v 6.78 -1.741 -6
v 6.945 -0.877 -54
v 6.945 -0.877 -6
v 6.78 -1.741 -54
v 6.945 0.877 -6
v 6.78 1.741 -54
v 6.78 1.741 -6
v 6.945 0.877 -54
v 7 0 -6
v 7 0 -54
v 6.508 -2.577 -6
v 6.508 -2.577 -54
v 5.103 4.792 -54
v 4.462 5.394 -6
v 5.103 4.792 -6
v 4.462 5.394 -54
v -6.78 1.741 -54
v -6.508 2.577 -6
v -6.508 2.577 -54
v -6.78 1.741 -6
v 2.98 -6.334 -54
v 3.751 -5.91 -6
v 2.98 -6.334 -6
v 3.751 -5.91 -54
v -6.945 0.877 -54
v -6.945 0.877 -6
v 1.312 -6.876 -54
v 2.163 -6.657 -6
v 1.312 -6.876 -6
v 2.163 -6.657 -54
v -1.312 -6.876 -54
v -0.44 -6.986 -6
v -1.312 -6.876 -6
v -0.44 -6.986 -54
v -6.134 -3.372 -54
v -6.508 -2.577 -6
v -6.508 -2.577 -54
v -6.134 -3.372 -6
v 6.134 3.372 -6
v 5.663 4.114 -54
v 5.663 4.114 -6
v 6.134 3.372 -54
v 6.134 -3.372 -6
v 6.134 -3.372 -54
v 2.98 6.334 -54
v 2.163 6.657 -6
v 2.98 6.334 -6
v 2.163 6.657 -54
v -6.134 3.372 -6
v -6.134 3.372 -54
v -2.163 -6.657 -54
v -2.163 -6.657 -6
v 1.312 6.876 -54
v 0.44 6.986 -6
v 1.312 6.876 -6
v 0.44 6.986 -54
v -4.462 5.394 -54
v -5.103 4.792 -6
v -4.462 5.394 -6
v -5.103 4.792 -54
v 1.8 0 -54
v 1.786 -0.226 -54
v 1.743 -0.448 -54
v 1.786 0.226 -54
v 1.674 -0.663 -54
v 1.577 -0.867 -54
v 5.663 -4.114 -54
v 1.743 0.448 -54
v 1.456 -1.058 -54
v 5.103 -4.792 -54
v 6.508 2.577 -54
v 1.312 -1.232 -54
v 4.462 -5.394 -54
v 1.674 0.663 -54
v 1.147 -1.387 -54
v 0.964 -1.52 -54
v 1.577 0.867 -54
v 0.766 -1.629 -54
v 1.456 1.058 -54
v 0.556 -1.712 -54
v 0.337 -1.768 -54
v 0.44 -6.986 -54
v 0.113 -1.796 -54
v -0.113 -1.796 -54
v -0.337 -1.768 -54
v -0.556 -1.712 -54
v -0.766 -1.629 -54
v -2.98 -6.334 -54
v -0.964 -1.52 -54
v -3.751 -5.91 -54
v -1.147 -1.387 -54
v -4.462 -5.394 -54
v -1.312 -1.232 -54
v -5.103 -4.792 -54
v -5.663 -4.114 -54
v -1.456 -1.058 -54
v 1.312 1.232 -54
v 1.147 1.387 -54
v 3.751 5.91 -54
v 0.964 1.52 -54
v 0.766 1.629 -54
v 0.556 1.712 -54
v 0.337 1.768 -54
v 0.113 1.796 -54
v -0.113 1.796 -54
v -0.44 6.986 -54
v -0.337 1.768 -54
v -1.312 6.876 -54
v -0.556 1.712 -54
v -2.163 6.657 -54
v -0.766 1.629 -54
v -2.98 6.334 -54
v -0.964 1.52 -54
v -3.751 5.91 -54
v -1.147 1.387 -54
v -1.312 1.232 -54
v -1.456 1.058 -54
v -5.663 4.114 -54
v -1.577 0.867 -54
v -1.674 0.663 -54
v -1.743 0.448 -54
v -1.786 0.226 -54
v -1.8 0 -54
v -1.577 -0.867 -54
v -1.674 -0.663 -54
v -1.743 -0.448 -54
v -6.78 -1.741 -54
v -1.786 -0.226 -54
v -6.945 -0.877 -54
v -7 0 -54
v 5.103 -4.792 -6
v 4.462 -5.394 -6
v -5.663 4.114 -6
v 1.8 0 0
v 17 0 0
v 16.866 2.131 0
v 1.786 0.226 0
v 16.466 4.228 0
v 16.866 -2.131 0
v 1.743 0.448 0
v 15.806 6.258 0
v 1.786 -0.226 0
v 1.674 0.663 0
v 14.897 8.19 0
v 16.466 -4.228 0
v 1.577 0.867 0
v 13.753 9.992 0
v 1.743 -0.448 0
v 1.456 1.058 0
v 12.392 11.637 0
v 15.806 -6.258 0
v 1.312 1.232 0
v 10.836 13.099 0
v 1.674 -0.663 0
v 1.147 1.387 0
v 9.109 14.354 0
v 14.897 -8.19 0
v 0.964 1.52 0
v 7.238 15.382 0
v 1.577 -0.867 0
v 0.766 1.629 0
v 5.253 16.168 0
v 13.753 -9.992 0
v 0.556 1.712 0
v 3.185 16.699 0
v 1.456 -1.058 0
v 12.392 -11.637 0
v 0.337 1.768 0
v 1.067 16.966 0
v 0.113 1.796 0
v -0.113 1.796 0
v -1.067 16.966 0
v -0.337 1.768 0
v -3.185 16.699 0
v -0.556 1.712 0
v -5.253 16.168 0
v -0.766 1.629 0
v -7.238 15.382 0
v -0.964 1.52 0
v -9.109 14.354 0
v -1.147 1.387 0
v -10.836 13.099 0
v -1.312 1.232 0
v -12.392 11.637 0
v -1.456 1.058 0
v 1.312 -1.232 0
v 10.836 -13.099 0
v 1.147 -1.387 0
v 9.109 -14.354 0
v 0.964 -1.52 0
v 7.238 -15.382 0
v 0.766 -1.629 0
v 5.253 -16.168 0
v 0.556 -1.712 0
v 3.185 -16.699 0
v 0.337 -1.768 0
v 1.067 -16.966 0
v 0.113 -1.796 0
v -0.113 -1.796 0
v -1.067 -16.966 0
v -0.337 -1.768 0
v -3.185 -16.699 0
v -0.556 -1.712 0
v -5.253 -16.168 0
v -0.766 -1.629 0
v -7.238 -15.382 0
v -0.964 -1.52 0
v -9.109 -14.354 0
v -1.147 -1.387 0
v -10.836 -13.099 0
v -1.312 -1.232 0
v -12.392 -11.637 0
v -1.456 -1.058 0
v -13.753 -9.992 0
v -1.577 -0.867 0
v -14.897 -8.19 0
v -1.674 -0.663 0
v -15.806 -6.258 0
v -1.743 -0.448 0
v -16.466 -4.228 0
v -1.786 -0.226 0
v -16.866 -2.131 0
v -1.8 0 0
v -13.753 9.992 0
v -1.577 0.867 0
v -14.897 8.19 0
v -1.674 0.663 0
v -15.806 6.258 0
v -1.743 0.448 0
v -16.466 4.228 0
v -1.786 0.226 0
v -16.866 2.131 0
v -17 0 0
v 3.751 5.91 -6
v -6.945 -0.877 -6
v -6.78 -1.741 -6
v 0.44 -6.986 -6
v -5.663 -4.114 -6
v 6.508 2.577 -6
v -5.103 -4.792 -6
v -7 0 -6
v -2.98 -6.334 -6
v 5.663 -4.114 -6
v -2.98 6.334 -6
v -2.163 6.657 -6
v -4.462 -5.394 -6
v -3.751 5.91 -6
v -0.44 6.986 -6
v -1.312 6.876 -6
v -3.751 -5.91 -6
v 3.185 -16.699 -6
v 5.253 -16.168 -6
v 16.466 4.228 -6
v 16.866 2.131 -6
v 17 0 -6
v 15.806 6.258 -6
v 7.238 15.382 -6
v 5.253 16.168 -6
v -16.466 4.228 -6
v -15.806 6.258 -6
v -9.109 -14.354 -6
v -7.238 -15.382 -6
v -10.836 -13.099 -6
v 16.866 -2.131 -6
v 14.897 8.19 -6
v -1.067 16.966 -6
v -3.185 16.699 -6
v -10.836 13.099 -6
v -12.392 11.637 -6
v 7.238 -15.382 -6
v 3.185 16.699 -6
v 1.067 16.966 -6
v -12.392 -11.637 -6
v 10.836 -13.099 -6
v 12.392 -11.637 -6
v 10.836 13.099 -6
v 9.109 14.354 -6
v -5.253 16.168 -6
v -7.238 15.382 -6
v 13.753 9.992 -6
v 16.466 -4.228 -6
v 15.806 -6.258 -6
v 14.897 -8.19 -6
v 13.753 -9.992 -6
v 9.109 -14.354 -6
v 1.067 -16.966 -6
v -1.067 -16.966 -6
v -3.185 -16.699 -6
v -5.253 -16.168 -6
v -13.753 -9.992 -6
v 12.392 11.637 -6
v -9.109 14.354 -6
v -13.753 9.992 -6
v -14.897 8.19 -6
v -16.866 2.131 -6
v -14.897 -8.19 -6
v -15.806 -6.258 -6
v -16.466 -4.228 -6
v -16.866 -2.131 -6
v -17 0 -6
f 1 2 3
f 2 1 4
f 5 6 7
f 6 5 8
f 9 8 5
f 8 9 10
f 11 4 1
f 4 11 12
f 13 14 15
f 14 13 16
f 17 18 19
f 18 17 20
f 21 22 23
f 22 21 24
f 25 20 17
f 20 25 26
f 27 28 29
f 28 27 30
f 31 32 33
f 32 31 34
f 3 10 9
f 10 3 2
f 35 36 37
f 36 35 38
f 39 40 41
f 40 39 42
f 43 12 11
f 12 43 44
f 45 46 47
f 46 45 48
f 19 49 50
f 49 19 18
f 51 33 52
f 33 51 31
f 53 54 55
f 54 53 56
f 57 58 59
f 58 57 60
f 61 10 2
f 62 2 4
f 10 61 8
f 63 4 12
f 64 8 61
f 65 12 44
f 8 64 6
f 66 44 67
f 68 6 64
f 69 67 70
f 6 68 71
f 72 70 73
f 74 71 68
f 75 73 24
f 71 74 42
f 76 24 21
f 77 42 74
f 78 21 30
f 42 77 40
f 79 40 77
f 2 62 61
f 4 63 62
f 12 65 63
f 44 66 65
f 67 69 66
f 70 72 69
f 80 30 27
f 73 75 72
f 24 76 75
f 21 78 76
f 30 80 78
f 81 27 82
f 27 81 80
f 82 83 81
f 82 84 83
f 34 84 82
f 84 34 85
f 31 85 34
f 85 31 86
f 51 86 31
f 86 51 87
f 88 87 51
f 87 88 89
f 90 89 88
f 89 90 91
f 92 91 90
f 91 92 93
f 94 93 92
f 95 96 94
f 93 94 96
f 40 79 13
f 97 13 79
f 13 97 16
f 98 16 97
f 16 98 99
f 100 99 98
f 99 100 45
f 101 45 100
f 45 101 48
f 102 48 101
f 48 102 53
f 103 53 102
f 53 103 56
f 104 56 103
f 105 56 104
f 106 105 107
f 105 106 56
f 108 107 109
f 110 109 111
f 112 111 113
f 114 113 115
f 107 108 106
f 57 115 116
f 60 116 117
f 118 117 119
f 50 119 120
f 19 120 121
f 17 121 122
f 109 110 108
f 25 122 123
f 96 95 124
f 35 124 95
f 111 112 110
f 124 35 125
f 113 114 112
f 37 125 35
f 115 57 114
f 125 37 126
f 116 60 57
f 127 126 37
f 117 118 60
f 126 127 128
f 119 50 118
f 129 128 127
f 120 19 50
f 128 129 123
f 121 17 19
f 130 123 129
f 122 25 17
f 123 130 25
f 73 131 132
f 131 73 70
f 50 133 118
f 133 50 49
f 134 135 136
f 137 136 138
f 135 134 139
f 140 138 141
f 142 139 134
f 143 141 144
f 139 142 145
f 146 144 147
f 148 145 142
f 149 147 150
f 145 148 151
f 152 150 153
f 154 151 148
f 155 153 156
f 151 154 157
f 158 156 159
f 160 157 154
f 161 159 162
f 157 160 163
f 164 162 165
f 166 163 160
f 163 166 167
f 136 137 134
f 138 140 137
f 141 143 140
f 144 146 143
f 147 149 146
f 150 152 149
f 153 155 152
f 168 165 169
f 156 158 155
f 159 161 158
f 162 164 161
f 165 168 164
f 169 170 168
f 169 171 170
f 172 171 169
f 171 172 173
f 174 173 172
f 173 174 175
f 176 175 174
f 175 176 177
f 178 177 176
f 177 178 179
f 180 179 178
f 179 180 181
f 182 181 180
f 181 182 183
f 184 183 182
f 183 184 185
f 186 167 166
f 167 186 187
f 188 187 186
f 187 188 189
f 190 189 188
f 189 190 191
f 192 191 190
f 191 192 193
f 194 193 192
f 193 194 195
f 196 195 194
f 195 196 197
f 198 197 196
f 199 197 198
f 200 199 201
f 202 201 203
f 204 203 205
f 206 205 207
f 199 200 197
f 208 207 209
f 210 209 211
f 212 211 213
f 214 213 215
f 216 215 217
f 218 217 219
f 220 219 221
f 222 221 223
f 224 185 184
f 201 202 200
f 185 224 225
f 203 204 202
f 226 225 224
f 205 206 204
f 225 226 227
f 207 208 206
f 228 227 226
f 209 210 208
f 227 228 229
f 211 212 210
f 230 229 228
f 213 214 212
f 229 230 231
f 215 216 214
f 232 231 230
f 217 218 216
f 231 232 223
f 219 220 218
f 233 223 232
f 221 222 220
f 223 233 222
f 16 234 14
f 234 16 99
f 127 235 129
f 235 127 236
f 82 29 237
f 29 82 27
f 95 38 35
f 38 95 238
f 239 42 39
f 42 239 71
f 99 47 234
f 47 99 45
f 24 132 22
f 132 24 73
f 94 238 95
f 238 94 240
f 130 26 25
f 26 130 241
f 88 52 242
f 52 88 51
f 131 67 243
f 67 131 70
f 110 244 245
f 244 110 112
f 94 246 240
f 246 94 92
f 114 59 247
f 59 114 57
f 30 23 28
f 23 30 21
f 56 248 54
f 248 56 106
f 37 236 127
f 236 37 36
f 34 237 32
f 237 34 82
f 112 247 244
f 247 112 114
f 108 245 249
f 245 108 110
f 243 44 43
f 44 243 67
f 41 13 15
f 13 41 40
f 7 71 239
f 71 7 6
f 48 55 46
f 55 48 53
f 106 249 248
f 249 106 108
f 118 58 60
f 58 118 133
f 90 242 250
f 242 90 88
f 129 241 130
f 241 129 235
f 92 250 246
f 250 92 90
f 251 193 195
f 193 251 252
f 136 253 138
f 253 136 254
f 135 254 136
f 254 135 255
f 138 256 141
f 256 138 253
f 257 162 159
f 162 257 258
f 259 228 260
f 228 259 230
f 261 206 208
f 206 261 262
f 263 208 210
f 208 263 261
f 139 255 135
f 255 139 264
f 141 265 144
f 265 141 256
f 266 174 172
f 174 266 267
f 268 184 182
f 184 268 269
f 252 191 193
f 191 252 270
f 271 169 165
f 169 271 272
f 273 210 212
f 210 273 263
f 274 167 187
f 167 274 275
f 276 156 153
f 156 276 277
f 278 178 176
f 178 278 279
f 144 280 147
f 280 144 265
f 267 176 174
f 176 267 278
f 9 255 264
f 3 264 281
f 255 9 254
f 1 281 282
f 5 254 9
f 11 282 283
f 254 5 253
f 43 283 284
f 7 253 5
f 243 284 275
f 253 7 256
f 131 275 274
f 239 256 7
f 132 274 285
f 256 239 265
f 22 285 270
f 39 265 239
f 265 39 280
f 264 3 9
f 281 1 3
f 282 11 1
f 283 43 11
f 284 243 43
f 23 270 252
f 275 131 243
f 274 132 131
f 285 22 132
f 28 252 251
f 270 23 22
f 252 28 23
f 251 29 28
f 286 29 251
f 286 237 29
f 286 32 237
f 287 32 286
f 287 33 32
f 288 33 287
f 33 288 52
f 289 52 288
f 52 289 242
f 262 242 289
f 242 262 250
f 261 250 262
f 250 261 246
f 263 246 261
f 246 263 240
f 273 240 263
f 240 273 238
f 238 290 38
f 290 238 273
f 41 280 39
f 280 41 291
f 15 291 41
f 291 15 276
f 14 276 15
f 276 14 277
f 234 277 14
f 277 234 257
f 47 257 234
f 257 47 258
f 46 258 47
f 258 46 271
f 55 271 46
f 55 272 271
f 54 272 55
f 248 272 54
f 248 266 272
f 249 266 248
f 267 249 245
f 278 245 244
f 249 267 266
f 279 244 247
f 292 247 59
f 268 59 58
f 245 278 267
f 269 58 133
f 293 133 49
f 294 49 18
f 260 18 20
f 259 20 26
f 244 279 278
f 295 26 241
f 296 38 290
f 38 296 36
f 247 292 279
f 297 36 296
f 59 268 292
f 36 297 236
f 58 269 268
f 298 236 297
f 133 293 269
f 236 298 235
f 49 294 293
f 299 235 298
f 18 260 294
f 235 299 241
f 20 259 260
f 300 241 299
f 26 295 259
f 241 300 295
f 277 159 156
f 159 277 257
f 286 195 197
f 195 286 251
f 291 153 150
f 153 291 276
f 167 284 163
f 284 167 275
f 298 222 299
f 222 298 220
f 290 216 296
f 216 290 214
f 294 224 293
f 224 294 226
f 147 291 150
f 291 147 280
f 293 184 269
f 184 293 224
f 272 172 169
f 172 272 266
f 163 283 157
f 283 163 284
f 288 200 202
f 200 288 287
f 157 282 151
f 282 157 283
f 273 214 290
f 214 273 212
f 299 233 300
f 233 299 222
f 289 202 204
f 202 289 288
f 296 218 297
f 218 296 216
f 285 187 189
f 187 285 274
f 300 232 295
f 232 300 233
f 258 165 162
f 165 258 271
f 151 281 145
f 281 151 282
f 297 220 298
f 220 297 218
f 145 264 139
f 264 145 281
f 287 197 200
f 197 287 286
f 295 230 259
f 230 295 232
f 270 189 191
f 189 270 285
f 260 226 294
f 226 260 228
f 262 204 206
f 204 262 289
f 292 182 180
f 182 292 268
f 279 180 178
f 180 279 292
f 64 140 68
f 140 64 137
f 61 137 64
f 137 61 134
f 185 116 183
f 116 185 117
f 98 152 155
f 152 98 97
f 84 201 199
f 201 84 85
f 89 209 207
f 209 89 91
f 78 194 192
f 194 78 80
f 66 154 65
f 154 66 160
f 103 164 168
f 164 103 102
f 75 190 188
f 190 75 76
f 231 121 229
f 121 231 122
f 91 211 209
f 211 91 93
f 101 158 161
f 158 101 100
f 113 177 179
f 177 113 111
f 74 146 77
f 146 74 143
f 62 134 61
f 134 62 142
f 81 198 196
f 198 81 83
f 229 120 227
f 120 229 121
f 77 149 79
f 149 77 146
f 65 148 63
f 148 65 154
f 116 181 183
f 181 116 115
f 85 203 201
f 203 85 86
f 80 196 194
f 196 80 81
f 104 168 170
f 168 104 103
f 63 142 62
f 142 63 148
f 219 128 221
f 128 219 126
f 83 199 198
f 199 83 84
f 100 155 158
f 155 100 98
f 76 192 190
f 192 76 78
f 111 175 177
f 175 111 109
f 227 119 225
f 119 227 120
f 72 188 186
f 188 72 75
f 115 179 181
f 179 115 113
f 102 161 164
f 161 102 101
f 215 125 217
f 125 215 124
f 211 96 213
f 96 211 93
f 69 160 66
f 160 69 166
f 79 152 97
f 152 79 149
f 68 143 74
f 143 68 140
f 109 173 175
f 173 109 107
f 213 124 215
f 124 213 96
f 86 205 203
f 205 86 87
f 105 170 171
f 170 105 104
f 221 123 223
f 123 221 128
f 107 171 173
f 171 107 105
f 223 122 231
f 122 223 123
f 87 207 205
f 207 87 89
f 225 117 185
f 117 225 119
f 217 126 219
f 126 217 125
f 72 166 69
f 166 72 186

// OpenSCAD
$fn = 50;


difference() {
	union() {
		translate(v = [0, 0, -54.0000000000]) {
			cylinder(h = 54, r = 7.0000000000);
		}
		translate(v = [0, 0, -6.0000000000]) {
			cylinder(h = 6, r = 17.0000000000);
		}
	}
	union() {
		#translate(v = [0, 0, -54]) {
			cylinder(h = 54, r = 1.8000000000);
		}
	}
}
